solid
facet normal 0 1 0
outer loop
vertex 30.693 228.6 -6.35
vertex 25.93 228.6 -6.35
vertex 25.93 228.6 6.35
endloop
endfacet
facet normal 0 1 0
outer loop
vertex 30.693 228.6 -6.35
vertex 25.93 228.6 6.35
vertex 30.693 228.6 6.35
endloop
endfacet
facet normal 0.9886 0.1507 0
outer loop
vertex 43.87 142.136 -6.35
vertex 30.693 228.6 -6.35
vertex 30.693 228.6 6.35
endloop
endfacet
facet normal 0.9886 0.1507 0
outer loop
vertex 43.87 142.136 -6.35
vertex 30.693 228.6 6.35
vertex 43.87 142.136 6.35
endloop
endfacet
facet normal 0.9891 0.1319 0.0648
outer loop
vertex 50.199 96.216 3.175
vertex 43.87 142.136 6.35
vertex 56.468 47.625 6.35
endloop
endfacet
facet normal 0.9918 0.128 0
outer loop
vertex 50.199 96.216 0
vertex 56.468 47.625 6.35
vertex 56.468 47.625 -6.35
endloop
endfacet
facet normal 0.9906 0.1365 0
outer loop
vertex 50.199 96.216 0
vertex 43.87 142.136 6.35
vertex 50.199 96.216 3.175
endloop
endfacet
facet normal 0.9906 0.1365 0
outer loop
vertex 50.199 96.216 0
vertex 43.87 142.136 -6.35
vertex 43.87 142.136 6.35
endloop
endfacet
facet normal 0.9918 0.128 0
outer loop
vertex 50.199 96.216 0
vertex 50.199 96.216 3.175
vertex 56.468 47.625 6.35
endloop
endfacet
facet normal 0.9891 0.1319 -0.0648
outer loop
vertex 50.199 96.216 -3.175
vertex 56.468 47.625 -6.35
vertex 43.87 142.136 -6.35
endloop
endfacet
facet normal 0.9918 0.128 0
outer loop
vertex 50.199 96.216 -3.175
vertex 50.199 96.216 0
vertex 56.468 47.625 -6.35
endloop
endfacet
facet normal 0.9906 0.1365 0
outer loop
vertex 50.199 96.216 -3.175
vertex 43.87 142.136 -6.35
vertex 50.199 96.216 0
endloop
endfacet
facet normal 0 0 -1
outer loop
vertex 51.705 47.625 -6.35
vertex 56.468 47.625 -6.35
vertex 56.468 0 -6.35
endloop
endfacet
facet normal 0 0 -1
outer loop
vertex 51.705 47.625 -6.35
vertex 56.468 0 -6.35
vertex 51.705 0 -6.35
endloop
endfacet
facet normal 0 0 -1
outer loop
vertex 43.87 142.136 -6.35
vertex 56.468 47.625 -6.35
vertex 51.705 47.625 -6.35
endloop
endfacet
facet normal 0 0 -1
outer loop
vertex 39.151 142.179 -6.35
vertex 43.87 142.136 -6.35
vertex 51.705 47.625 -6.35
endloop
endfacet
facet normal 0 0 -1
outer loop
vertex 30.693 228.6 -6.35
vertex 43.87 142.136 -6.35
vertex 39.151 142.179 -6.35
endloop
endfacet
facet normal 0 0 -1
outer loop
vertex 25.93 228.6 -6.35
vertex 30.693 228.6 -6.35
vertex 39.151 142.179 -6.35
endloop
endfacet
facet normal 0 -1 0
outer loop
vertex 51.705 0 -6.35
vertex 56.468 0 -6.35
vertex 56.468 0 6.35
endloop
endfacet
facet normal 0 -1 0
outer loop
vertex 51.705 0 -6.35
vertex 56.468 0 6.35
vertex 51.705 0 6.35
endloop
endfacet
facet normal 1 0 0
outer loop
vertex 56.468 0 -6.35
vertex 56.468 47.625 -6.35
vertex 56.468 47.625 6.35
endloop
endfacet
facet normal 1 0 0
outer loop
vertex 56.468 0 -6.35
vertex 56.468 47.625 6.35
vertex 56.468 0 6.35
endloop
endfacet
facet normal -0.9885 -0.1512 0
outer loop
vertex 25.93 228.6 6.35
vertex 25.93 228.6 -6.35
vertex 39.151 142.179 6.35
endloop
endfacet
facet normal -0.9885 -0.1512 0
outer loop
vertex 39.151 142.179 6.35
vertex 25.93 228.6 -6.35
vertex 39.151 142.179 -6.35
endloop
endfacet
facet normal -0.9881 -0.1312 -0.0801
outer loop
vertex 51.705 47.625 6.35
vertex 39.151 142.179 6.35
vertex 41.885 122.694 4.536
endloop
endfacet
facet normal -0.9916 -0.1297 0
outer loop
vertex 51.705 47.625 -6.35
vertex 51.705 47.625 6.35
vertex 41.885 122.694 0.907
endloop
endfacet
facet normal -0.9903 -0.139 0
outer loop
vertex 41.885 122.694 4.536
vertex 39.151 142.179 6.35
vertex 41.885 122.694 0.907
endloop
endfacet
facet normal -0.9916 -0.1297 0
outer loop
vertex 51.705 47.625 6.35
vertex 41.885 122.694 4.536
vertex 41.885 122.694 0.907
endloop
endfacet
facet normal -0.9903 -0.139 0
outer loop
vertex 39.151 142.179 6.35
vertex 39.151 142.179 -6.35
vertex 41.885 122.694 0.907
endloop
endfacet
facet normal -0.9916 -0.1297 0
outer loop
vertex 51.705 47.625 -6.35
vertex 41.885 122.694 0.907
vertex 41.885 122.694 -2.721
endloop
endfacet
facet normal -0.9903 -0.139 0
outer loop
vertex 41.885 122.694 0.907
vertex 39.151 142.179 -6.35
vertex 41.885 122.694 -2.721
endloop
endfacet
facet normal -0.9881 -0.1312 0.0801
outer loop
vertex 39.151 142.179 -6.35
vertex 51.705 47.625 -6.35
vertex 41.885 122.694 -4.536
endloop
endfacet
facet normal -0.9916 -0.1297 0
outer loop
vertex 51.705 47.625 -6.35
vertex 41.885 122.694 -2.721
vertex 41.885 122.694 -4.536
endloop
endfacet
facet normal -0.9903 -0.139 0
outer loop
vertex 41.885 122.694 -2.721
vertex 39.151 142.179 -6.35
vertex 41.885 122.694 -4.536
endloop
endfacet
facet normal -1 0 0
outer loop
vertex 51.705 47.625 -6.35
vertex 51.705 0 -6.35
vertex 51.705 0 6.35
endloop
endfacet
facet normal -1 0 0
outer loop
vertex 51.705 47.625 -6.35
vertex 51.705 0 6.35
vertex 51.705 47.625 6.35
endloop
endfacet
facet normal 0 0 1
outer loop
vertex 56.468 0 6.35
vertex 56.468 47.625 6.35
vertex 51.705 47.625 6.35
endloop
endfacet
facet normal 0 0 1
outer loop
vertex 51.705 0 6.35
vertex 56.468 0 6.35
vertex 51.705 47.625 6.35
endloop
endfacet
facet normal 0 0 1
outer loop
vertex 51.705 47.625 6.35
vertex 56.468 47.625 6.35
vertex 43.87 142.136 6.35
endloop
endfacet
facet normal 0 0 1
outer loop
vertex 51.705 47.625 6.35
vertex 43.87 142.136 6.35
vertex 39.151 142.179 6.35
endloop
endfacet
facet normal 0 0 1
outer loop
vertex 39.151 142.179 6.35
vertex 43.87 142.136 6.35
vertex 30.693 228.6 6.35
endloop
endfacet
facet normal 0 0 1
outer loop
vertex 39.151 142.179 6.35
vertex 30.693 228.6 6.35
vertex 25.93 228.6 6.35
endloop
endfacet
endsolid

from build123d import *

# Parameters (mm, degrees)
BOSS_EXTRUDE1_DEPTH      = 6.35
BOSS_EXTRUDE1_DEPTH_BACK = 6.35


with BuildPart() as part:
    # Sketch3 → Boss-Extrude1 (new, two sides: drawn at the far end of the back side and taken through both)
    with BuildSketch(Plane.XY.offset(-BOSS_EXTRUDE1_DEPTH_BACK)):
        with BuildLine():
            Line((25.930295497, 228.6), (30.692795497, 228.6))
            add(Edge.make_bspline(
                [(30.692795497, 228.6), (32.656671965, 216.59798975), (34.557493546, 204.585654572), (41.339553497, 160.498217254), (45.907919412, 128.375397263), (52.344898005, 80.136373161), (54.419889898, 64.046285851), (56.441032457, 47.840855492), (56.454490883, 47.732922744), (56.467945104, 47.625)],
                knots=[0.158181503, 0.158181503, 0.158181503, 0.158181503, 0.194666408, 0.194666408, 0.291999611, 0.291999611, 0.340666213, 0.340666213, 0.340992559, 0.340992559, 0.340992559, 0.340992559], degree=3))
            Line((56.467945104, 47.625), (56.467945104, 0))
            Line((56.467945104, 0), (51.705445104, 0))
            Line((51.705445104, 0), (51.705445104, 47.625))
            add(Edge.make_bspline(
                [(25.930295497, 228.6), (28.835110587, 210.988612906), (34.358497112, 175.720617461), (40.71056634, 131.542229957), (45.5050338, 96.160367974), (48.389330035, 74.025463782), (50.34888675, 58.533876957), (51.261329801, 51.213221833), (51.621113082, 48.307200473), (51.705445104, 47.625)],
                knots=[0.158553364, 0.158553364, 0.158553364, 0.158553364, 0.216147542, 0.273741721, 0.30253881, 0.3313359, 0.345734444, 0.352933717, 0.355143131, 0.355143131, 0.355143131, 0.355143131], degree=3))
        make_face()
    extrude(amount=BOSS_EXTRUDE1_DEPTH + BOSS_EXTRUDE1_DEPTH_BACK)


solid = part.part
